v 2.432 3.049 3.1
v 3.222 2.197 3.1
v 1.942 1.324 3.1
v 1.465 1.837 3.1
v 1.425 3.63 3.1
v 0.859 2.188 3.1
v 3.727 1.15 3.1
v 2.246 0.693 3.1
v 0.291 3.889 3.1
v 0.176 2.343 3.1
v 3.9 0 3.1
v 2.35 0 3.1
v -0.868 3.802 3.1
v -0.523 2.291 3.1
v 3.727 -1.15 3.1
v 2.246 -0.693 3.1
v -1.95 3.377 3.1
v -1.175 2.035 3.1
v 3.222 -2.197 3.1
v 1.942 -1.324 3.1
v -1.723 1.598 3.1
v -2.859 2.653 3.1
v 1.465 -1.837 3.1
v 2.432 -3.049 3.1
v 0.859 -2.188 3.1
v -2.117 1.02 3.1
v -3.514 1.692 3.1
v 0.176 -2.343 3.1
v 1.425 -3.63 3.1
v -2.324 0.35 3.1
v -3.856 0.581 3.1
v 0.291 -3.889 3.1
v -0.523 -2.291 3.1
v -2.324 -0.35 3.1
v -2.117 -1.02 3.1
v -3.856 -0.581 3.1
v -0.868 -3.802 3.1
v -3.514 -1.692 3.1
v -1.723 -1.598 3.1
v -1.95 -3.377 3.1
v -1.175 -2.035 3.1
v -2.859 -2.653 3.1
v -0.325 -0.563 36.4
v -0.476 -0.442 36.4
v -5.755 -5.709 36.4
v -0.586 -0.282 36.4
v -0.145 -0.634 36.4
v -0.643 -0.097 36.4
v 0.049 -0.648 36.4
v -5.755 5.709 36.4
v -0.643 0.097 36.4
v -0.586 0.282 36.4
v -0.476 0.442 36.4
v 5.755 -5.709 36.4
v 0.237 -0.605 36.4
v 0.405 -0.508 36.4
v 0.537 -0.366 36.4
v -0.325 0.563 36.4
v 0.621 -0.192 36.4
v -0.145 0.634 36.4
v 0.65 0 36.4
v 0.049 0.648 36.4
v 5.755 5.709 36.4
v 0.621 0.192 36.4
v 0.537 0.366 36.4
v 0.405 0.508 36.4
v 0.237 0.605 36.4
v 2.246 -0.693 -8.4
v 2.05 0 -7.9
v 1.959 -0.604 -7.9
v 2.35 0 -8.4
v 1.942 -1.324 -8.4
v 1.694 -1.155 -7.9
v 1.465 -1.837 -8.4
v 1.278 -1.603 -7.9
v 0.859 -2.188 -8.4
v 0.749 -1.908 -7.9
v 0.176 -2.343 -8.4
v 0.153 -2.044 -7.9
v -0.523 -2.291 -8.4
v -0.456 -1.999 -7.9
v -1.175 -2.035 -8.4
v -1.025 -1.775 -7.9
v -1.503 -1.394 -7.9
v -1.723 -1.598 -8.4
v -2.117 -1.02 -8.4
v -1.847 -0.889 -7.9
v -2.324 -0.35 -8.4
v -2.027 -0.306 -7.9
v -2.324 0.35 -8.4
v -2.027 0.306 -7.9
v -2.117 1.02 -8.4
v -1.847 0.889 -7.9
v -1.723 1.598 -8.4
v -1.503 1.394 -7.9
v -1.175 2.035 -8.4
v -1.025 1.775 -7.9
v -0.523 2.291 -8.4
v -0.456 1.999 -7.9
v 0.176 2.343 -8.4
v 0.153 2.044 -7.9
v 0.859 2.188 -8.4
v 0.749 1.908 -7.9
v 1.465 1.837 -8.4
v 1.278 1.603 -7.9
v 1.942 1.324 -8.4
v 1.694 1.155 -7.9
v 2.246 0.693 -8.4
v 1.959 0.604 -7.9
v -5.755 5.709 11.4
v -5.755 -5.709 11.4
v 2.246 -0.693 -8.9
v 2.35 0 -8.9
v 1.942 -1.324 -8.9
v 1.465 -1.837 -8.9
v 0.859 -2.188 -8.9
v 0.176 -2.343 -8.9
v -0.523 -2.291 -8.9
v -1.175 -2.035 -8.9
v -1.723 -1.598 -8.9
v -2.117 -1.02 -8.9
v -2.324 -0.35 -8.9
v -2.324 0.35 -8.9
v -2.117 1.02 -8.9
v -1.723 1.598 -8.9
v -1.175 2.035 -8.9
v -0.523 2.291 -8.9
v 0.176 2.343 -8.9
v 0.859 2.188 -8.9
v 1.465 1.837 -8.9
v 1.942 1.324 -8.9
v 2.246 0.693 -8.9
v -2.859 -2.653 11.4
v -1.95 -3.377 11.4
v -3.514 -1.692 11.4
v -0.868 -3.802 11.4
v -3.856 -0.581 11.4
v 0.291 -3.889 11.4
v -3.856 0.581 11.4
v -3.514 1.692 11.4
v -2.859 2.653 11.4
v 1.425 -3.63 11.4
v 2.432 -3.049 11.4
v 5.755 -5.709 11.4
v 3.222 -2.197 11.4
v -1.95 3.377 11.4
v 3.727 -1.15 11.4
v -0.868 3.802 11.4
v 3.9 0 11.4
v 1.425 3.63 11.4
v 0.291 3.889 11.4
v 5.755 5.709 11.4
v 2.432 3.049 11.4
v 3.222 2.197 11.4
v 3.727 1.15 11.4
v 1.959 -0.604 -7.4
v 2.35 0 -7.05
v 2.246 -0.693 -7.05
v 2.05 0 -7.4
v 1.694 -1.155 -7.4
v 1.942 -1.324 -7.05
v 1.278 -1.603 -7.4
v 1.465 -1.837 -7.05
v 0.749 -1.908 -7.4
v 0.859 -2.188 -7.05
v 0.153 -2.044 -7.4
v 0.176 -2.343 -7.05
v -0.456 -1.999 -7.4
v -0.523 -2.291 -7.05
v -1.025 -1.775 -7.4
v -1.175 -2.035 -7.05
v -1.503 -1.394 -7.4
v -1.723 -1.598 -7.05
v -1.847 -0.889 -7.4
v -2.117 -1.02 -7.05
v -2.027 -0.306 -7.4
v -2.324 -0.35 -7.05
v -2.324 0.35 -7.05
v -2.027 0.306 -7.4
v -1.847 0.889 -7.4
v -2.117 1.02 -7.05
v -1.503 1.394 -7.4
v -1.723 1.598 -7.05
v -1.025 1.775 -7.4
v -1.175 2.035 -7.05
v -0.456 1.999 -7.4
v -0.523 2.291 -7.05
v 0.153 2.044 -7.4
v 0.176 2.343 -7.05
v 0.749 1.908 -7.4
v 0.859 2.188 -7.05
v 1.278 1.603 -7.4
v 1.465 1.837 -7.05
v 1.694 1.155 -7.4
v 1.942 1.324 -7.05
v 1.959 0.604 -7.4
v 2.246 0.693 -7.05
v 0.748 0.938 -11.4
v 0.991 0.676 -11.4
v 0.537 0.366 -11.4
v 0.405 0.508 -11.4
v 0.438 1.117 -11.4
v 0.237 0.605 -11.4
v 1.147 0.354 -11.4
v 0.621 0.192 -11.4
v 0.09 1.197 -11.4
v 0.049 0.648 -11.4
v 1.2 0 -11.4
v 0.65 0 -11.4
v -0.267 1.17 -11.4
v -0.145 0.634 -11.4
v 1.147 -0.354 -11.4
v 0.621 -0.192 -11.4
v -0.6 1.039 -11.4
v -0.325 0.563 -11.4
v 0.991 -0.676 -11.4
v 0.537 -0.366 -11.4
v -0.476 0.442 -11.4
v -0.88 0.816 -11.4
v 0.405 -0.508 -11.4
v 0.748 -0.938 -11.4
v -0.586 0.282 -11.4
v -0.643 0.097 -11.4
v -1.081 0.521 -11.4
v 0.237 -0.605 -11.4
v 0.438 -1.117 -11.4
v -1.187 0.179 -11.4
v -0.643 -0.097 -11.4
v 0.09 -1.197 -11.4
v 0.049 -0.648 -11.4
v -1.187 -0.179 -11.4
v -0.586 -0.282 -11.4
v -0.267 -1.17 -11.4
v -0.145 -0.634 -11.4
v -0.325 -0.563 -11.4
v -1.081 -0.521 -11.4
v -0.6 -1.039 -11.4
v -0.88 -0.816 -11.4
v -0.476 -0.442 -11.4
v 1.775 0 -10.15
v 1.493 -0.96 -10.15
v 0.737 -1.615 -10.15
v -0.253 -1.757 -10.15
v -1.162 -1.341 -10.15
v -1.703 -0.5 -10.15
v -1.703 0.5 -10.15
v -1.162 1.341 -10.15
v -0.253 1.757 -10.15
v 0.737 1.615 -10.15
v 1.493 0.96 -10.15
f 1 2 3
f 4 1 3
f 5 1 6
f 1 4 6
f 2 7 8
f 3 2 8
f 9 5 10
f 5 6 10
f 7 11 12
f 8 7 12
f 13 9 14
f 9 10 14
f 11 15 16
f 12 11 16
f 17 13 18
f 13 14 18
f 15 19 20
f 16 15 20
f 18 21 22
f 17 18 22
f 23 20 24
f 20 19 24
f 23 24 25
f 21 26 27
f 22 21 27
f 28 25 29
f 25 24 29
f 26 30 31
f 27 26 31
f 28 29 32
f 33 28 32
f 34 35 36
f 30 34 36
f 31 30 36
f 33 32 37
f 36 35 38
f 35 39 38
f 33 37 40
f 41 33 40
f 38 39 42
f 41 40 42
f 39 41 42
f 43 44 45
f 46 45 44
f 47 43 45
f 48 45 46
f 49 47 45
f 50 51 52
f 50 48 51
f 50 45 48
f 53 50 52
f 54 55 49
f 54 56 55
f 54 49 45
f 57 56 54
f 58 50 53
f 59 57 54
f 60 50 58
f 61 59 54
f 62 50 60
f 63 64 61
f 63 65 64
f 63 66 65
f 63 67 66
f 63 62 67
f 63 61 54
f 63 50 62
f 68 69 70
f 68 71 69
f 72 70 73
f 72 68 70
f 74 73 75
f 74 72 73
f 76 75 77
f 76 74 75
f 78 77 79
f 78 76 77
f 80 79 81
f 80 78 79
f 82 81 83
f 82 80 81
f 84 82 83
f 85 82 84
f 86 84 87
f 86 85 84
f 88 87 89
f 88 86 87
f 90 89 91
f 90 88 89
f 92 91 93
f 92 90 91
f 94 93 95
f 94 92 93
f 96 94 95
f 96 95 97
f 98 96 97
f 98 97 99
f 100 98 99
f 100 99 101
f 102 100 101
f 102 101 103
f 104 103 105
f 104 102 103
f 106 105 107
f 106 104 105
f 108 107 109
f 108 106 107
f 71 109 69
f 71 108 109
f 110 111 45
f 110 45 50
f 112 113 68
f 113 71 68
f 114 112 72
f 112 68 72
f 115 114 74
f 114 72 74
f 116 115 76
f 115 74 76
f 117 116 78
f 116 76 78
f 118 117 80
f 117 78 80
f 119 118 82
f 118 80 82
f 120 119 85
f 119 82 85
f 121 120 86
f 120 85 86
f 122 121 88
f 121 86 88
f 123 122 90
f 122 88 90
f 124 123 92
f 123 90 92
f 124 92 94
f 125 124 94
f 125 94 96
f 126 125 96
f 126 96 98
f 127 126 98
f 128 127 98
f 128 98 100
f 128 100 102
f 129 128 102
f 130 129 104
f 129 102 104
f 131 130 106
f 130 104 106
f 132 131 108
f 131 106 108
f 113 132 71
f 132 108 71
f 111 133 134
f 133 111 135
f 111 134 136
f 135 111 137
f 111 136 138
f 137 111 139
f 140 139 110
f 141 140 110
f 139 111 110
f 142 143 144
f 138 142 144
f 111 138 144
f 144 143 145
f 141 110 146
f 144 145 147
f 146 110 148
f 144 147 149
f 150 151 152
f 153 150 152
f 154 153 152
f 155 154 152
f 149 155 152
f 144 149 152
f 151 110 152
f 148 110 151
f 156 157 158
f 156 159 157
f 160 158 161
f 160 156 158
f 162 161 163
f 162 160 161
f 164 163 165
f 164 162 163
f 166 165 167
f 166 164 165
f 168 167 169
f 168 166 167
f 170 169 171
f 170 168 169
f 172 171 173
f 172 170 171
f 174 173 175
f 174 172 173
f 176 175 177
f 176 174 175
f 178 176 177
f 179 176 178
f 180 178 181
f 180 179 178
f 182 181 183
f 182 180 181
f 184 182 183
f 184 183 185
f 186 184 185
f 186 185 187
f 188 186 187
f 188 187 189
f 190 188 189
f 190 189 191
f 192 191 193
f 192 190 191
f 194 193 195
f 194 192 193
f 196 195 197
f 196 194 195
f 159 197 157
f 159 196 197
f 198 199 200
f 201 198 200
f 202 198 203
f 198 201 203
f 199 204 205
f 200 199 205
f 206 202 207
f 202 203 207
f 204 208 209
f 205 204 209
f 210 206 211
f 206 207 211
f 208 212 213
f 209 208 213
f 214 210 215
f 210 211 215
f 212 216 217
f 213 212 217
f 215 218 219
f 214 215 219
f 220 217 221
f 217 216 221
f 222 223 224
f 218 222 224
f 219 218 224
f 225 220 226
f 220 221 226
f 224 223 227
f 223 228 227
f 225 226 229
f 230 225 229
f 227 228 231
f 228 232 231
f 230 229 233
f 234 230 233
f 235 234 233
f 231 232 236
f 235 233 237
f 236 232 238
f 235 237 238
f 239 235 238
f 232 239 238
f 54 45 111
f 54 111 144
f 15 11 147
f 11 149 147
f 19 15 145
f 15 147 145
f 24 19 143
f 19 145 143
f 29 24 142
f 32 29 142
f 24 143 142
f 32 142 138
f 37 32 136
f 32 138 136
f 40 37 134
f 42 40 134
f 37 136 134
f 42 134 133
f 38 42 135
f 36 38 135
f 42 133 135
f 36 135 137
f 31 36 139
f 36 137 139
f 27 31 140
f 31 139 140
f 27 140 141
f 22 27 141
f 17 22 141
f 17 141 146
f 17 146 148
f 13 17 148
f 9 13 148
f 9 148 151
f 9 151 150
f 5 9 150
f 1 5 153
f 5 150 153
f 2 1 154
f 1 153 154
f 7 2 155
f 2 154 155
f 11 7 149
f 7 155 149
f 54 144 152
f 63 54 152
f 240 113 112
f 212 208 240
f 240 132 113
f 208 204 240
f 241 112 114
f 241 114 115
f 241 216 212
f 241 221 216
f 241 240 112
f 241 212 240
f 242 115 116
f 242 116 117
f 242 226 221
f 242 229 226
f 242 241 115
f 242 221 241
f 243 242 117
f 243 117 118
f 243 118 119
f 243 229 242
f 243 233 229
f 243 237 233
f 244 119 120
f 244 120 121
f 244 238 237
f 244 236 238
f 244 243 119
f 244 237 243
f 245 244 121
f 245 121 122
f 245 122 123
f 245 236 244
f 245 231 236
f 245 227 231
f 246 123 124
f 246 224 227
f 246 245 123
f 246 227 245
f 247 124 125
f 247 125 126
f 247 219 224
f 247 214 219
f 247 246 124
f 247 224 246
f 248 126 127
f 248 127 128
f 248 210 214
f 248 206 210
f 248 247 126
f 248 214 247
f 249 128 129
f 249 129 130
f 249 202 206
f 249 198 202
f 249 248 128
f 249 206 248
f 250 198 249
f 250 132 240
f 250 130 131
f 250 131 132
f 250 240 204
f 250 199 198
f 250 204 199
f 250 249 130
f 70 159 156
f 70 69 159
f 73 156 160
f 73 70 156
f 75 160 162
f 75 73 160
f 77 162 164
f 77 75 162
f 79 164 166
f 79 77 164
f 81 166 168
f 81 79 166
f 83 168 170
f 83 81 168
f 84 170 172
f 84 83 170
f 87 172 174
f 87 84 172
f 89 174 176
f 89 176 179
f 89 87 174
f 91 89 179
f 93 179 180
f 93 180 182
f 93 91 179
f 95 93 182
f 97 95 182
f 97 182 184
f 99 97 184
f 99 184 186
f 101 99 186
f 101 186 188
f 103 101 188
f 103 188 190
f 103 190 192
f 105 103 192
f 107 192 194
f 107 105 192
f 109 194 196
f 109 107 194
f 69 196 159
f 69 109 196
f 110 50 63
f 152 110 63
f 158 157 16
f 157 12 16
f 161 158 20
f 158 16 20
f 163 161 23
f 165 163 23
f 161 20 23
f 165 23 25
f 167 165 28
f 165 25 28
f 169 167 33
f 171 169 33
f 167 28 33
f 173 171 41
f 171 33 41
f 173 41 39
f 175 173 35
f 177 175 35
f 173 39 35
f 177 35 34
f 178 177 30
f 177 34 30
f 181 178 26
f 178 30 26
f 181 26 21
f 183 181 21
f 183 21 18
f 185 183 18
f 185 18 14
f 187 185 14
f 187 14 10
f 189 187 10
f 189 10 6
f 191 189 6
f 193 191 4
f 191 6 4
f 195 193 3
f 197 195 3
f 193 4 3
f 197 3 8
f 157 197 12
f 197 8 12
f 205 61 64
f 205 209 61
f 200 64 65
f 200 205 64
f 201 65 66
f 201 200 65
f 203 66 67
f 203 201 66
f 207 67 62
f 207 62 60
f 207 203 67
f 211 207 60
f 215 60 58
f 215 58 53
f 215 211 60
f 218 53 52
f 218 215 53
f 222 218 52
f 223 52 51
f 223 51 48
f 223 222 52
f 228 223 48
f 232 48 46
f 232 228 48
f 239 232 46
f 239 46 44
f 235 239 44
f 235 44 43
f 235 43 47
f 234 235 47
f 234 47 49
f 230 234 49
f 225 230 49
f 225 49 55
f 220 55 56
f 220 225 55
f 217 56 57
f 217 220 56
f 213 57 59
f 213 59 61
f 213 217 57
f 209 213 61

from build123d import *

# Parameters (mm, degrees)
F0_W     = 2.35
F0_H     = 14.5
F4_R     = 0.65
F5_DEPTH = 22.801
F6_W     = 11.5107307211
F6_H     = 11.4176999778
F6_R     = 3.9
F6_R_2   = 0.65
F7_DEPTH = 25


with BuildPart() as f1:
    # F0 (on Front) → F1 (revolve)
    with BuildSketch(Plane.XZ):
        Polygon((3.9, 11.4), (0, 11.4), (0, 3.1), (2.35, 3.1), (3.9, 3.1), align=None)
        with Locations((1.175, -4.15)):
            Rectangle(F0_W, F0_H)
    revolve(axis=Axis((0, 0, 0), (0, 0, -1)))

    # F2 (on Front) → F3 (revolve, cut)
    with BuildSketch(Plane.XZ):
        Polygon((2.05, -7.9), (2.35, -8.4), (2.35, -7.05), (2.05, -7.4), align=None)
        Polygon((2.35, -8.9), (1.2, -11.4), (2.35, -11.4), align=None)
    revolve(axis=Axis((0, 0, 0), (0, 0, -1)), mode=Mode.SUBTRACT)

    # F4 (on face) → F5 (cut, through all)
    with BuildSketch(Plane(origin=(0, 0, -11.4), x_dir=(1, 0, 0), z_dir=(0, 0, -1))):
        Circle(F4_R)
    extrude(amount=-F5_DEPTH, mode=Mode.SUBTRACT)

    # F6 (on face) → F7 (join)
    with BuildSketch(Plane.XY.offset(11.4)):
        Rectangle(F6_W, F6_H)
        Circle(F6_R, mode=Mode.SUBTRACT)
        Circle(F6_R)
        Circle(F6_R_2, mode=Mode.SUBTRACT)
    extrude(amount=F7_DEPTH)


solid = f1.part
